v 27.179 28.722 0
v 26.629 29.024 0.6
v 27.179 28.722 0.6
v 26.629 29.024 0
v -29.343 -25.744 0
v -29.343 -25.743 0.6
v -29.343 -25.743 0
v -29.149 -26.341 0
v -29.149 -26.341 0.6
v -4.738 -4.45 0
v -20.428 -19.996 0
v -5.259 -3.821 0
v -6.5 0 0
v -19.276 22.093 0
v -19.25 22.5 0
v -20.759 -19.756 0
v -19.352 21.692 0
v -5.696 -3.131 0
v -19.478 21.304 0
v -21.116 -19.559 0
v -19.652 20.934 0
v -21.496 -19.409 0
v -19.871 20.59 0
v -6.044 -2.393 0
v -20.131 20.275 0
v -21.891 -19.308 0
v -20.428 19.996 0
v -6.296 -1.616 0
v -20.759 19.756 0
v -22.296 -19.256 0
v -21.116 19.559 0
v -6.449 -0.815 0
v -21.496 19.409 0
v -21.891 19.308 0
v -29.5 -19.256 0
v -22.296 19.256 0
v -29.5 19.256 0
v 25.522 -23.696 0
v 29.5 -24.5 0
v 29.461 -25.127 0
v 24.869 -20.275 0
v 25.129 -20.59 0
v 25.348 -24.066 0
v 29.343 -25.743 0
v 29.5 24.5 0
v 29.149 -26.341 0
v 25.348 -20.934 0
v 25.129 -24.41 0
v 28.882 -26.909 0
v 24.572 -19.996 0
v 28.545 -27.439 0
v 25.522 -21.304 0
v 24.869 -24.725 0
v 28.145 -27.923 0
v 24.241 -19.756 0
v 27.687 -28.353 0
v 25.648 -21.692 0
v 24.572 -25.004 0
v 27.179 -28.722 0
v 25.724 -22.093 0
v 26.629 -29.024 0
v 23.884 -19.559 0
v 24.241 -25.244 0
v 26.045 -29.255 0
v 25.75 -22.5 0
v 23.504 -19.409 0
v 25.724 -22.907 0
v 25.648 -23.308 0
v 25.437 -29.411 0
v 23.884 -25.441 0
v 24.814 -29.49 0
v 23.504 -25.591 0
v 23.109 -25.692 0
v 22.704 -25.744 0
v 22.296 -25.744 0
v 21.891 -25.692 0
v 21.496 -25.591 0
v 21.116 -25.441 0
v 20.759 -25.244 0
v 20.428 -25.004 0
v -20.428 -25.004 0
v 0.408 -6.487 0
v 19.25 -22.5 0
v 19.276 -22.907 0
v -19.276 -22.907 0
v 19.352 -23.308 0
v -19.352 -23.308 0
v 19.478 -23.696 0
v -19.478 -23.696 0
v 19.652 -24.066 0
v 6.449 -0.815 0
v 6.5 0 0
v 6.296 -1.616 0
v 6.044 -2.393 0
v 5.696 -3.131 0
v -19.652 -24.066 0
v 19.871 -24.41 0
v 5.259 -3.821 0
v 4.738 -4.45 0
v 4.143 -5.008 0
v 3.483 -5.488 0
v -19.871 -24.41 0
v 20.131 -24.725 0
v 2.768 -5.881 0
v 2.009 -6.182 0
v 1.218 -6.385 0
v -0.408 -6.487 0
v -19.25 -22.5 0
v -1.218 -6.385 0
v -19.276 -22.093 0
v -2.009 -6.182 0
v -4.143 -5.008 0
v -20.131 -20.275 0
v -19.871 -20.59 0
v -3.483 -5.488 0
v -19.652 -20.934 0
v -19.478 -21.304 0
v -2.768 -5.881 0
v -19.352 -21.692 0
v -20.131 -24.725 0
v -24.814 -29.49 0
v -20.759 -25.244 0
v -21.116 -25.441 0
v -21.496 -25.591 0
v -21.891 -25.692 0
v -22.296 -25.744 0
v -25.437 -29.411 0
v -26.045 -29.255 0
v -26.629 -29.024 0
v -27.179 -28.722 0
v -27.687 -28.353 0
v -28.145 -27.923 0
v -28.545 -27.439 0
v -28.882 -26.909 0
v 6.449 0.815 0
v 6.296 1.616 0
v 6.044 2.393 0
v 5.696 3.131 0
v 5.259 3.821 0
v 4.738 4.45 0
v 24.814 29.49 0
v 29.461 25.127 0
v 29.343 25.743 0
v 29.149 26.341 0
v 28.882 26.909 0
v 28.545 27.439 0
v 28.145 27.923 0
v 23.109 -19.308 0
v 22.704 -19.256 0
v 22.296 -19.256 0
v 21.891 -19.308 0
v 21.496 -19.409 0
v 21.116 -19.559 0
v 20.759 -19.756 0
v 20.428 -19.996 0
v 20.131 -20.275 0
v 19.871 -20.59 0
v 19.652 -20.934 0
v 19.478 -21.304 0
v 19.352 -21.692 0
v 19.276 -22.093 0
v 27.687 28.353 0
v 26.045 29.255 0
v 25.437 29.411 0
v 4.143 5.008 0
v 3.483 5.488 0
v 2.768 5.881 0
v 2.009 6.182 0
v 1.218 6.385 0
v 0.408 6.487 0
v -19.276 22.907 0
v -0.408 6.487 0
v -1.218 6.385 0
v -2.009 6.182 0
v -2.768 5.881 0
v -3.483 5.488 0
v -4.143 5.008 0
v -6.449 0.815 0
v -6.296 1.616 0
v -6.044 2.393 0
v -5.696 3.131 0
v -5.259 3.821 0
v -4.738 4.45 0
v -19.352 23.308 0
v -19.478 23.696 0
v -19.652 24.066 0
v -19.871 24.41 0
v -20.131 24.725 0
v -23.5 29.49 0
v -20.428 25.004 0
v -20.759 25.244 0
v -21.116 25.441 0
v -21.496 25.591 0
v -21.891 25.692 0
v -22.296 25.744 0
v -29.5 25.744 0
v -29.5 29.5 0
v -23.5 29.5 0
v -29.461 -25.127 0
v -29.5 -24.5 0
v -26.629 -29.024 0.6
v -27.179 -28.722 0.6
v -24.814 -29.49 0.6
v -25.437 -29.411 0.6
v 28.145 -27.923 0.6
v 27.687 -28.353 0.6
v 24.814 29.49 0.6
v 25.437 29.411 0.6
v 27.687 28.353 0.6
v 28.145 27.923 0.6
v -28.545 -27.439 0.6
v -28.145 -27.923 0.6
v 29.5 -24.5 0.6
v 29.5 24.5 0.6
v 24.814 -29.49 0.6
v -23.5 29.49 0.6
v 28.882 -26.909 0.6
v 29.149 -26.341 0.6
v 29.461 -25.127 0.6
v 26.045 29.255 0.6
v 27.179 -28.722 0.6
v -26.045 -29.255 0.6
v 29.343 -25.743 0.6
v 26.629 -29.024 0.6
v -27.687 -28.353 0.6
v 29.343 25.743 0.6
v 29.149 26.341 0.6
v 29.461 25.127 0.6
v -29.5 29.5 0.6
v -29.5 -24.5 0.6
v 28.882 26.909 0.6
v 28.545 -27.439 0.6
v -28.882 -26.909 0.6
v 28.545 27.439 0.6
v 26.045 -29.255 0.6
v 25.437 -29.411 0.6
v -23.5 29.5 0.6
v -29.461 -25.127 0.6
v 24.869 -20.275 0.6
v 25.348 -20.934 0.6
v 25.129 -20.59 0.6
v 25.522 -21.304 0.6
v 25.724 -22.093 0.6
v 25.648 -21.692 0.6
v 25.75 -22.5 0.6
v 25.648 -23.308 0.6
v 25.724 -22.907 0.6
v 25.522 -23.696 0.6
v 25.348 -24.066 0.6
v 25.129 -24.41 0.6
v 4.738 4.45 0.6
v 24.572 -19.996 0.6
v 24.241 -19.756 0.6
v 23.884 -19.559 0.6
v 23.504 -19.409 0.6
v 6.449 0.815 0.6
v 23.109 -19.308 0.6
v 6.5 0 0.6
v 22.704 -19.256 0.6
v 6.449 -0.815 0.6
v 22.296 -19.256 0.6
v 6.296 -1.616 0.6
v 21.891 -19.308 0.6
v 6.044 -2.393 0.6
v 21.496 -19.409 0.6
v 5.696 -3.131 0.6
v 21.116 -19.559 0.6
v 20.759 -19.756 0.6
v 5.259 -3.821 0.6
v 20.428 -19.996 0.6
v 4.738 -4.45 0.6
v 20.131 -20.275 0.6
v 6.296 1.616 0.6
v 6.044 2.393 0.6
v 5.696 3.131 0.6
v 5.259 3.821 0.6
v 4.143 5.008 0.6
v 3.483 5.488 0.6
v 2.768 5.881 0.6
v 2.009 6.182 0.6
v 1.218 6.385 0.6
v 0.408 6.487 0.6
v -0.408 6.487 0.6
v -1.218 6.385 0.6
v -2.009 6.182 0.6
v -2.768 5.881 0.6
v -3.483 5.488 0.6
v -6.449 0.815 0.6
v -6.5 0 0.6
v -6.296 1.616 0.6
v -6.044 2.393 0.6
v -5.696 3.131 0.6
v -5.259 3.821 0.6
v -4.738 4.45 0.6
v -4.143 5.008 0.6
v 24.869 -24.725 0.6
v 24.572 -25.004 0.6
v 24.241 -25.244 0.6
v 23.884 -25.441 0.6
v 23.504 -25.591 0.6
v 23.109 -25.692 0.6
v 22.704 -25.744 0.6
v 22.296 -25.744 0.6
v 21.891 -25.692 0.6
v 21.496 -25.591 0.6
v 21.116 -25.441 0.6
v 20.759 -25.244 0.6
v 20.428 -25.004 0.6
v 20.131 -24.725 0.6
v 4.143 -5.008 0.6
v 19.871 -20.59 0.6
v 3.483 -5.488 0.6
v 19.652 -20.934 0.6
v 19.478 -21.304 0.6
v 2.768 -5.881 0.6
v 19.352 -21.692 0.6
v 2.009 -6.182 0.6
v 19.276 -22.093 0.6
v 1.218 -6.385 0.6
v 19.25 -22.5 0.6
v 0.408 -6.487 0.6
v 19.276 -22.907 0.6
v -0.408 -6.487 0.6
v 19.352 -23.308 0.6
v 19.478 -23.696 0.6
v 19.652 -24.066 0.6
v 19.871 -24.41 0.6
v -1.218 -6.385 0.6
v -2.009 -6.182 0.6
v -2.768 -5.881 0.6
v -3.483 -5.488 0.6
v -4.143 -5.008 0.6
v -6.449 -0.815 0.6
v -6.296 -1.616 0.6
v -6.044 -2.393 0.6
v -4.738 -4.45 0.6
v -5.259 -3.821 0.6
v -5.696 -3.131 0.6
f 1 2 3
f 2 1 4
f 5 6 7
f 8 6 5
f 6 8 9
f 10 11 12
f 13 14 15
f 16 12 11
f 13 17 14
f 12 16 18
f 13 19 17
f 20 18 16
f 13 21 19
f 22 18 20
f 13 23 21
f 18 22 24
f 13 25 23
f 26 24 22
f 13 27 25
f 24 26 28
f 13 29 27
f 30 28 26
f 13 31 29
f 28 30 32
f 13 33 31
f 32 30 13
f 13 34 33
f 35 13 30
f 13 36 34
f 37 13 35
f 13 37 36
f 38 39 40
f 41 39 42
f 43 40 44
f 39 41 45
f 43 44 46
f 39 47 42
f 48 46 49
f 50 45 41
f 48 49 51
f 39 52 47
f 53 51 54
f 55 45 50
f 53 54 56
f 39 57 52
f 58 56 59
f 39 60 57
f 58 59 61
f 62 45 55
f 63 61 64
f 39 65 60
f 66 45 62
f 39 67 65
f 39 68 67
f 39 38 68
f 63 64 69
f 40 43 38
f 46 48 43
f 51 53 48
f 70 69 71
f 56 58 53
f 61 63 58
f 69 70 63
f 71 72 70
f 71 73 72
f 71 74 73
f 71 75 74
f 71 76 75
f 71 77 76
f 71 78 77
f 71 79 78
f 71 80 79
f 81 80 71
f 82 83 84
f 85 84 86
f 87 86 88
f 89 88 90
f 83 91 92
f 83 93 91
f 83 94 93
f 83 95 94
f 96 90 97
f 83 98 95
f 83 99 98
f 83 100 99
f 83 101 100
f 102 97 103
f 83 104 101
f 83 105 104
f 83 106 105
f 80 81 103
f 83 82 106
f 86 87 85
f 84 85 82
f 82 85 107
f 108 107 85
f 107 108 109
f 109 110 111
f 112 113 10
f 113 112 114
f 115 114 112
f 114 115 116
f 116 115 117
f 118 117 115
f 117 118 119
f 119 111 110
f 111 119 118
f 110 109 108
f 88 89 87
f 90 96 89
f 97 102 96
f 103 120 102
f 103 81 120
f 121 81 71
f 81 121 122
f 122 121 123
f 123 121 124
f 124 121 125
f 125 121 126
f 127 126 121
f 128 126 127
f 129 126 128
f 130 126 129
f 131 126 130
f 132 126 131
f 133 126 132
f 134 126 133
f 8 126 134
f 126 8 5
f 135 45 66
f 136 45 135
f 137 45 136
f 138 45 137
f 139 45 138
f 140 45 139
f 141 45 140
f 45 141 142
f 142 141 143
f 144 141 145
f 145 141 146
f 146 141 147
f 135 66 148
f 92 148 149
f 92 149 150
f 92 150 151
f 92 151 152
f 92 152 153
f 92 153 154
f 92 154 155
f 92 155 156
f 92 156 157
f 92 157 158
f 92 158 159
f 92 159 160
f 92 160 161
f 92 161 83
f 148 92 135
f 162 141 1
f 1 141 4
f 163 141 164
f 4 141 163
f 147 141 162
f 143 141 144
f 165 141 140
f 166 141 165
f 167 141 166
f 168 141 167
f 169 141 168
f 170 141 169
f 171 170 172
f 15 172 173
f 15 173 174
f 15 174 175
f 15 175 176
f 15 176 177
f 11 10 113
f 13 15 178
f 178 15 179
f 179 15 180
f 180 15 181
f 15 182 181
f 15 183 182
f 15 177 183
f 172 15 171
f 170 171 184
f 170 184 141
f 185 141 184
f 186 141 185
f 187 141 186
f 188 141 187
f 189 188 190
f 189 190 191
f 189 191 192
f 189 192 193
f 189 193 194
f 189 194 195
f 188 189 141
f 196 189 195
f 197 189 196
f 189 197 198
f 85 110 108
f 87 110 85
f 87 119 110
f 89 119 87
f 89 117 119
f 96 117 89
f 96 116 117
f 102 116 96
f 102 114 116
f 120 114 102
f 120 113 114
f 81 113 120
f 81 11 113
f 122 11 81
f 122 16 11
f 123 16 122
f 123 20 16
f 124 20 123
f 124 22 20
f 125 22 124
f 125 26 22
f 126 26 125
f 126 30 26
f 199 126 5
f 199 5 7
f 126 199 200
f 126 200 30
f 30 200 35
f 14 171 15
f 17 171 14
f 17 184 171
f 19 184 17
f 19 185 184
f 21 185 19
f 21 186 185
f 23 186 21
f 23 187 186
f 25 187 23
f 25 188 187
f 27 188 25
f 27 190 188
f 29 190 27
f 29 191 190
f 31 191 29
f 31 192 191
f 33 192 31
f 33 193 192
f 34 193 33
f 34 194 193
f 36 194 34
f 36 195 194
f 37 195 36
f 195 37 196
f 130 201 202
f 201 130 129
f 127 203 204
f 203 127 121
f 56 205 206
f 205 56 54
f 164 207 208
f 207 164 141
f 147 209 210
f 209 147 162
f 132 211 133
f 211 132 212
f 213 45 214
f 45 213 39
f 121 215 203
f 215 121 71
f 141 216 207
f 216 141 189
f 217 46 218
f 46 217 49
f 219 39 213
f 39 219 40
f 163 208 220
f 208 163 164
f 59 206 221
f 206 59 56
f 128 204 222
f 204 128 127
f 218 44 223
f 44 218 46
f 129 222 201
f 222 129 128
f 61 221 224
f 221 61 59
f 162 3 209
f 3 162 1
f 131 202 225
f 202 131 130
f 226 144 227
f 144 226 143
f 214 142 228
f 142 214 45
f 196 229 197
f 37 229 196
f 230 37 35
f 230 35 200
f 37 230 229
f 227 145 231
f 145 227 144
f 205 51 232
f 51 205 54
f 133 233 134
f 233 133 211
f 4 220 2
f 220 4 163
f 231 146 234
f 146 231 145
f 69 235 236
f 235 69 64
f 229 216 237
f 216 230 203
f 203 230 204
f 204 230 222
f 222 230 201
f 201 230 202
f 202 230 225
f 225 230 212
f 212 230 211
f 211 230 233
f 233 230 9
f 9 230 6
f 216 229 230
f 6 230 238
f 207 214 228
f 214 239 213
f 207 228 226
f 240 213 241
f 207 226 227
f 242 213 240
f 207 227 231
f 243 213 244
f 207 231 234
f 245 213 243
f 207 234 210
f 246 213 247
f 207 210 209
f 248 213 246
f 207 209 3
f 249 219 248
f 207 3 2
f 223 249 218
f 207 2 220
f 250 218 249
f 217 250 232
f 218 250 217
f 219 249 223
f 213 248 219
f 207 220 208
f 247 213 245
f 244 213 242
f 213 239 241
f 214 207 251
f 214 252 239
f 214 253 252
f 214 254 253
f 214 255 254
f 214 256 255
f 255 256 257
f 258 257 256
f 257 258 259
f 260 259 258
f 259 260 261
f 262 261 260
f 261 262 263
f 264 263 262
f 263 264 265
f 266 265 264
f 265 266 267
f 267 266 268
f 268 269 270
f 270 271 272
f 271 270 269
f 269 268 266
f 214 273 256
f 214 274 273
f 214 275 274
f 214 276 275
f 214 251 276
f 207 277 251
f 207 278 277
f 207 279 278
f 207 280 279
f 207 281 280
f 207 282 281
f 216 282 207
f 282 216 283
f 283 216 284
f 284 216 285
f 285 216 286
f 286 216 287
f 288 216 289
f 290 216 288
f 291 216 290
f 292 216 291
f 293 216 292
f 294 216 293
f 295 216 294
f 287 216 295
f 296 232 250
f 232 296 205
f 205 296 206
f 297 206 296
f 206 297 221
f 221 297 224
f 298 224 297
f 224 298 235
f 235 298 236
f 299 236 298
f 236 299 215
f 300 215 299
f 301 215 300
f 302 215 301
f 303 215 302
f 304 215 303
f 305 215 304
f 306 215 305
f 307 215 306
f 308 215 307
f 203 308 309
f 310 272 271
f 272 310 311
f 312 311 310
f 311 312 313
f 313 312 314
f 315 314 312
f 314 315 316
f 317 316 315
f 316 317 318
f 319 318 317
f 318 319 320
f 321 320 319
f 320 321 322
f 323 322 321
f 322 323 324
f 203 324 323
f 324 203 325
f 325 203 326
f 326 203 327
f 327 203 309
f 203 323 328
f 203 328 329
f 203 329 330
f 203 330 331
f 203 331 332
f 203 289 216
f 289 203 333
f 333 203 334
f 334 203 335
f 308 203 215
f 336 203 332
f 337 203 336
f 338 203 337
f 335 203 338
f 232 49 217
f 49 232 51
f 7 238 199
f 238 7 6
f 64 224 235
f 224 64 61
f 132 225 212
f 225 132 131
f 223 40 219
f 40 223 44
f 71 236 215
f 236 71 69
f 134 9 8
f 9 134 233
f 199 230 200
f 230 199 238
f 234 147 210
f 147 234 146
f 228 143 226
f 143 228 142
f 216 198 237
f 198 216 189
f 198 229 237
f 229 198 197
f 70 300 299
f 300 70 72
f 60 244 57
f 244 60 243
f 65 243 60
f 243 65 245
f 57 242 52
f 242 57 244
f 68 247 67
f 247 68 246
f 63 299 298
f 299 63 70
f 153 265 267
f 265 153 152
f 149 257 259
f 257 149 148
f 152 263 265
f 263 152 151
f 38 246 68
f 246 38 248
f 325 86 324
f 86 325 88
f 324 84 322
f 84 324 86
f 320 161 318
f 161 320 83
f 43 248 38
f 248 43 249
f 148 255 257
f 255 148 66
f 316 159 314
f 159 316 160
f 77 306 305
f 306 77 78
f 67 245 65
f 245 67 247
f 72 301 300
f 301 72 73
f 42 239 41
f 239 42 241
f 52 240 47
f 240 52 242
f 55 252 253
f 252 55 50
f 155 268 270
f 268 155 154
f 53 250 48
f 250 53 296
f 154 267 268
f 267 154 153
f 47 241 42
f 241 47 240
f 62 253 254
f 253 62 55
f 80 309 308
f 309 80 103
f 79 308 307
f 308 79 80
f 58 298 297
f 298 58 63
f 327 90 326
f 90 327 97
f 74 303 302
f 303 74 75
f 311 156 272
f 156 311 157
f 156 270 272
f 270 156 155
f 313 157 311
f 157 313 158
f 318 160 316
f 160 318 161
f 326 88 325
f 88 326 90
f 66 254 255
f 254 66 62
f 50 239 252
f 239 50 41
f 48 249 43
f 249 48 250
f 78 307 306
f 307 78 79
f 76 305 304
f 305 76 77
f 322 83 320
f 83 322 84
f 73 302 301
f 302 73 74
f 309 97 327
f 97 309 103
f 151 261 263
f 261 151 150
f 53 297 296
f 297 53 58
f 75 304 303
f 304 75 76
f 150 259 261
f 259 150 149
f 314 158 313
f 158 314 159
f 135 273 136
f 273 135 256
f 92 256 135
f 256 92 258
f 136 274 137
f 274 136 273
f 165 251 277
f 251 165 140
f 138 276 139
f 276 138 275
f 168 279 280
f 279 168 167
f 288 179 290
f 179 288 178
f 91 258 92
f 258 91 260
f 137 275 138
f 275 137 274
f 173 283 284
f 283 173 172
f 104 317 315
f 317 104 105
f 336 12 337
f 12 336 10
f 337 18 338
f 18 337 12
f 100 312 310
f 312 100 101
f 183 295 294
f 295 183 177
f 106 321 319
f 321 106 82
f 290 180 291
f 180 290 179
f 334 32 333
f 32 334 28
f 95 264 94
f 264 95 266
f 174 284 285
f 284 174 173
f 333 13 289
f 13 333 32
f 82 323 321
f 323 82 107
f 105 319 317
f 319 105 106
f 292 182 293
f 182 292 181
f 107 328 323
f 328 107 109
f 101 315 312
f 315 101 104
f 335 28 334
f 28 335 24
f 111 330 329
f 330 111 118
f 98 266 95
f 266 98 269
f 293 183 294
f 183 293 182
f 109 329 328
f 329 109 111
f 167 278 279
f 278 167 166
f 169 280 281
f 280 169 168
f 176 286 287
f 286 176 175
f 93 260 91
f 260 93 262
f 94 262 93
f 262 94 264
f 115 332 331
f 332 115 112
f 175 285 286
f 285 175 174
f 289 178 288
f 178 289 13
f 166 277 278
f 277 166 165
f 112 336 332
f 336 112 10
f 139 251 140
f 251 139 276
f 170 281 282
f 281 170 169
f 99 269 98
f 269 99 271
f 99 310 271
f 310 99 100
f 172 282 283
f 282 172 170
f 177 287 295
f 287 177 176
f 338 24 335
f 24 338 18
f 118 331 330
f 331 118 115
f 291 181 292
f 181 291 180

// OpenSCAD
$fn = 50;


difference() {
	union() {
		hull() {
			translate(v = [-24.5000000000, 24.5000000000, 0]) {
				cylinder(h = 0.6000000000, r = 5);
			}
			translate(v = [24.5000000000, 24.5000000000, 0]) {
				cylinder(h = 0.6000000000, r = 5);
			}
			translate(v = [-24.5000000000, -24.5000000000, 0]) {
				cylinder(h = 0.6000000000, r = 5);
			}
			translate(v = [24.5000000000, -24.5000000000, 0]) {
				cylinder(h = 0.6000000000, r = 5);
			}
		}
		translate(v = [-29.5000000000, 23.5000000000, 0]) {
			cube(size = [6, 6, 0.6000000000]);
		}
	}
	union() {
		translate(v = [-30.0000000000, -22.5000000000, -250.0000000000]) {
			rotate(a = [0, 0, 0]) {
				difference() {
					union() {
						hull() {
							translate(v = [7.5000000000, 0, 0]) {
								cylinder(h = 250, r = 3.2500000000, r1 = 3.2500000000, r2 = 3.2500000000);
							}
							translate(v = [-7.5000000000, 0, 0]) {
								cylinder(h = 250, r = 3.2500000000, r1 = 3.2500000000, r2 = 3.2500000000);
							}
						}
					}
					union();
				}
			}
		}
		translate(v = [-30.0000000000, 22.5000000000, -250.0000000000]) {
			rotate(a = [0, 0, 0]) {
				difference() {
					union() {
						hull() {
							translate(v = [7.5000000000, 0, 0]) {
								cylinder(h = 250, r = 3.2500000000, r1 = 3.2500000000, r2 = 3.2500000000);
							}
							translate(v = [-7.5000000000, 0, 0]) {
								cylinder(h = 250, r = 3.2500000000, r1 = 3.2500000000, r2 = 3.2500000000);
							}
						}
					}
					union();
				}
			}
		}
		translate(v = [22.5000000000, -22.5000000000, 0]) {
			cylinder(h = 100, r = 3.2500000000);
		}
		cylinder(h = 0.6000000000, r = 6.5000000000);
	}
}
